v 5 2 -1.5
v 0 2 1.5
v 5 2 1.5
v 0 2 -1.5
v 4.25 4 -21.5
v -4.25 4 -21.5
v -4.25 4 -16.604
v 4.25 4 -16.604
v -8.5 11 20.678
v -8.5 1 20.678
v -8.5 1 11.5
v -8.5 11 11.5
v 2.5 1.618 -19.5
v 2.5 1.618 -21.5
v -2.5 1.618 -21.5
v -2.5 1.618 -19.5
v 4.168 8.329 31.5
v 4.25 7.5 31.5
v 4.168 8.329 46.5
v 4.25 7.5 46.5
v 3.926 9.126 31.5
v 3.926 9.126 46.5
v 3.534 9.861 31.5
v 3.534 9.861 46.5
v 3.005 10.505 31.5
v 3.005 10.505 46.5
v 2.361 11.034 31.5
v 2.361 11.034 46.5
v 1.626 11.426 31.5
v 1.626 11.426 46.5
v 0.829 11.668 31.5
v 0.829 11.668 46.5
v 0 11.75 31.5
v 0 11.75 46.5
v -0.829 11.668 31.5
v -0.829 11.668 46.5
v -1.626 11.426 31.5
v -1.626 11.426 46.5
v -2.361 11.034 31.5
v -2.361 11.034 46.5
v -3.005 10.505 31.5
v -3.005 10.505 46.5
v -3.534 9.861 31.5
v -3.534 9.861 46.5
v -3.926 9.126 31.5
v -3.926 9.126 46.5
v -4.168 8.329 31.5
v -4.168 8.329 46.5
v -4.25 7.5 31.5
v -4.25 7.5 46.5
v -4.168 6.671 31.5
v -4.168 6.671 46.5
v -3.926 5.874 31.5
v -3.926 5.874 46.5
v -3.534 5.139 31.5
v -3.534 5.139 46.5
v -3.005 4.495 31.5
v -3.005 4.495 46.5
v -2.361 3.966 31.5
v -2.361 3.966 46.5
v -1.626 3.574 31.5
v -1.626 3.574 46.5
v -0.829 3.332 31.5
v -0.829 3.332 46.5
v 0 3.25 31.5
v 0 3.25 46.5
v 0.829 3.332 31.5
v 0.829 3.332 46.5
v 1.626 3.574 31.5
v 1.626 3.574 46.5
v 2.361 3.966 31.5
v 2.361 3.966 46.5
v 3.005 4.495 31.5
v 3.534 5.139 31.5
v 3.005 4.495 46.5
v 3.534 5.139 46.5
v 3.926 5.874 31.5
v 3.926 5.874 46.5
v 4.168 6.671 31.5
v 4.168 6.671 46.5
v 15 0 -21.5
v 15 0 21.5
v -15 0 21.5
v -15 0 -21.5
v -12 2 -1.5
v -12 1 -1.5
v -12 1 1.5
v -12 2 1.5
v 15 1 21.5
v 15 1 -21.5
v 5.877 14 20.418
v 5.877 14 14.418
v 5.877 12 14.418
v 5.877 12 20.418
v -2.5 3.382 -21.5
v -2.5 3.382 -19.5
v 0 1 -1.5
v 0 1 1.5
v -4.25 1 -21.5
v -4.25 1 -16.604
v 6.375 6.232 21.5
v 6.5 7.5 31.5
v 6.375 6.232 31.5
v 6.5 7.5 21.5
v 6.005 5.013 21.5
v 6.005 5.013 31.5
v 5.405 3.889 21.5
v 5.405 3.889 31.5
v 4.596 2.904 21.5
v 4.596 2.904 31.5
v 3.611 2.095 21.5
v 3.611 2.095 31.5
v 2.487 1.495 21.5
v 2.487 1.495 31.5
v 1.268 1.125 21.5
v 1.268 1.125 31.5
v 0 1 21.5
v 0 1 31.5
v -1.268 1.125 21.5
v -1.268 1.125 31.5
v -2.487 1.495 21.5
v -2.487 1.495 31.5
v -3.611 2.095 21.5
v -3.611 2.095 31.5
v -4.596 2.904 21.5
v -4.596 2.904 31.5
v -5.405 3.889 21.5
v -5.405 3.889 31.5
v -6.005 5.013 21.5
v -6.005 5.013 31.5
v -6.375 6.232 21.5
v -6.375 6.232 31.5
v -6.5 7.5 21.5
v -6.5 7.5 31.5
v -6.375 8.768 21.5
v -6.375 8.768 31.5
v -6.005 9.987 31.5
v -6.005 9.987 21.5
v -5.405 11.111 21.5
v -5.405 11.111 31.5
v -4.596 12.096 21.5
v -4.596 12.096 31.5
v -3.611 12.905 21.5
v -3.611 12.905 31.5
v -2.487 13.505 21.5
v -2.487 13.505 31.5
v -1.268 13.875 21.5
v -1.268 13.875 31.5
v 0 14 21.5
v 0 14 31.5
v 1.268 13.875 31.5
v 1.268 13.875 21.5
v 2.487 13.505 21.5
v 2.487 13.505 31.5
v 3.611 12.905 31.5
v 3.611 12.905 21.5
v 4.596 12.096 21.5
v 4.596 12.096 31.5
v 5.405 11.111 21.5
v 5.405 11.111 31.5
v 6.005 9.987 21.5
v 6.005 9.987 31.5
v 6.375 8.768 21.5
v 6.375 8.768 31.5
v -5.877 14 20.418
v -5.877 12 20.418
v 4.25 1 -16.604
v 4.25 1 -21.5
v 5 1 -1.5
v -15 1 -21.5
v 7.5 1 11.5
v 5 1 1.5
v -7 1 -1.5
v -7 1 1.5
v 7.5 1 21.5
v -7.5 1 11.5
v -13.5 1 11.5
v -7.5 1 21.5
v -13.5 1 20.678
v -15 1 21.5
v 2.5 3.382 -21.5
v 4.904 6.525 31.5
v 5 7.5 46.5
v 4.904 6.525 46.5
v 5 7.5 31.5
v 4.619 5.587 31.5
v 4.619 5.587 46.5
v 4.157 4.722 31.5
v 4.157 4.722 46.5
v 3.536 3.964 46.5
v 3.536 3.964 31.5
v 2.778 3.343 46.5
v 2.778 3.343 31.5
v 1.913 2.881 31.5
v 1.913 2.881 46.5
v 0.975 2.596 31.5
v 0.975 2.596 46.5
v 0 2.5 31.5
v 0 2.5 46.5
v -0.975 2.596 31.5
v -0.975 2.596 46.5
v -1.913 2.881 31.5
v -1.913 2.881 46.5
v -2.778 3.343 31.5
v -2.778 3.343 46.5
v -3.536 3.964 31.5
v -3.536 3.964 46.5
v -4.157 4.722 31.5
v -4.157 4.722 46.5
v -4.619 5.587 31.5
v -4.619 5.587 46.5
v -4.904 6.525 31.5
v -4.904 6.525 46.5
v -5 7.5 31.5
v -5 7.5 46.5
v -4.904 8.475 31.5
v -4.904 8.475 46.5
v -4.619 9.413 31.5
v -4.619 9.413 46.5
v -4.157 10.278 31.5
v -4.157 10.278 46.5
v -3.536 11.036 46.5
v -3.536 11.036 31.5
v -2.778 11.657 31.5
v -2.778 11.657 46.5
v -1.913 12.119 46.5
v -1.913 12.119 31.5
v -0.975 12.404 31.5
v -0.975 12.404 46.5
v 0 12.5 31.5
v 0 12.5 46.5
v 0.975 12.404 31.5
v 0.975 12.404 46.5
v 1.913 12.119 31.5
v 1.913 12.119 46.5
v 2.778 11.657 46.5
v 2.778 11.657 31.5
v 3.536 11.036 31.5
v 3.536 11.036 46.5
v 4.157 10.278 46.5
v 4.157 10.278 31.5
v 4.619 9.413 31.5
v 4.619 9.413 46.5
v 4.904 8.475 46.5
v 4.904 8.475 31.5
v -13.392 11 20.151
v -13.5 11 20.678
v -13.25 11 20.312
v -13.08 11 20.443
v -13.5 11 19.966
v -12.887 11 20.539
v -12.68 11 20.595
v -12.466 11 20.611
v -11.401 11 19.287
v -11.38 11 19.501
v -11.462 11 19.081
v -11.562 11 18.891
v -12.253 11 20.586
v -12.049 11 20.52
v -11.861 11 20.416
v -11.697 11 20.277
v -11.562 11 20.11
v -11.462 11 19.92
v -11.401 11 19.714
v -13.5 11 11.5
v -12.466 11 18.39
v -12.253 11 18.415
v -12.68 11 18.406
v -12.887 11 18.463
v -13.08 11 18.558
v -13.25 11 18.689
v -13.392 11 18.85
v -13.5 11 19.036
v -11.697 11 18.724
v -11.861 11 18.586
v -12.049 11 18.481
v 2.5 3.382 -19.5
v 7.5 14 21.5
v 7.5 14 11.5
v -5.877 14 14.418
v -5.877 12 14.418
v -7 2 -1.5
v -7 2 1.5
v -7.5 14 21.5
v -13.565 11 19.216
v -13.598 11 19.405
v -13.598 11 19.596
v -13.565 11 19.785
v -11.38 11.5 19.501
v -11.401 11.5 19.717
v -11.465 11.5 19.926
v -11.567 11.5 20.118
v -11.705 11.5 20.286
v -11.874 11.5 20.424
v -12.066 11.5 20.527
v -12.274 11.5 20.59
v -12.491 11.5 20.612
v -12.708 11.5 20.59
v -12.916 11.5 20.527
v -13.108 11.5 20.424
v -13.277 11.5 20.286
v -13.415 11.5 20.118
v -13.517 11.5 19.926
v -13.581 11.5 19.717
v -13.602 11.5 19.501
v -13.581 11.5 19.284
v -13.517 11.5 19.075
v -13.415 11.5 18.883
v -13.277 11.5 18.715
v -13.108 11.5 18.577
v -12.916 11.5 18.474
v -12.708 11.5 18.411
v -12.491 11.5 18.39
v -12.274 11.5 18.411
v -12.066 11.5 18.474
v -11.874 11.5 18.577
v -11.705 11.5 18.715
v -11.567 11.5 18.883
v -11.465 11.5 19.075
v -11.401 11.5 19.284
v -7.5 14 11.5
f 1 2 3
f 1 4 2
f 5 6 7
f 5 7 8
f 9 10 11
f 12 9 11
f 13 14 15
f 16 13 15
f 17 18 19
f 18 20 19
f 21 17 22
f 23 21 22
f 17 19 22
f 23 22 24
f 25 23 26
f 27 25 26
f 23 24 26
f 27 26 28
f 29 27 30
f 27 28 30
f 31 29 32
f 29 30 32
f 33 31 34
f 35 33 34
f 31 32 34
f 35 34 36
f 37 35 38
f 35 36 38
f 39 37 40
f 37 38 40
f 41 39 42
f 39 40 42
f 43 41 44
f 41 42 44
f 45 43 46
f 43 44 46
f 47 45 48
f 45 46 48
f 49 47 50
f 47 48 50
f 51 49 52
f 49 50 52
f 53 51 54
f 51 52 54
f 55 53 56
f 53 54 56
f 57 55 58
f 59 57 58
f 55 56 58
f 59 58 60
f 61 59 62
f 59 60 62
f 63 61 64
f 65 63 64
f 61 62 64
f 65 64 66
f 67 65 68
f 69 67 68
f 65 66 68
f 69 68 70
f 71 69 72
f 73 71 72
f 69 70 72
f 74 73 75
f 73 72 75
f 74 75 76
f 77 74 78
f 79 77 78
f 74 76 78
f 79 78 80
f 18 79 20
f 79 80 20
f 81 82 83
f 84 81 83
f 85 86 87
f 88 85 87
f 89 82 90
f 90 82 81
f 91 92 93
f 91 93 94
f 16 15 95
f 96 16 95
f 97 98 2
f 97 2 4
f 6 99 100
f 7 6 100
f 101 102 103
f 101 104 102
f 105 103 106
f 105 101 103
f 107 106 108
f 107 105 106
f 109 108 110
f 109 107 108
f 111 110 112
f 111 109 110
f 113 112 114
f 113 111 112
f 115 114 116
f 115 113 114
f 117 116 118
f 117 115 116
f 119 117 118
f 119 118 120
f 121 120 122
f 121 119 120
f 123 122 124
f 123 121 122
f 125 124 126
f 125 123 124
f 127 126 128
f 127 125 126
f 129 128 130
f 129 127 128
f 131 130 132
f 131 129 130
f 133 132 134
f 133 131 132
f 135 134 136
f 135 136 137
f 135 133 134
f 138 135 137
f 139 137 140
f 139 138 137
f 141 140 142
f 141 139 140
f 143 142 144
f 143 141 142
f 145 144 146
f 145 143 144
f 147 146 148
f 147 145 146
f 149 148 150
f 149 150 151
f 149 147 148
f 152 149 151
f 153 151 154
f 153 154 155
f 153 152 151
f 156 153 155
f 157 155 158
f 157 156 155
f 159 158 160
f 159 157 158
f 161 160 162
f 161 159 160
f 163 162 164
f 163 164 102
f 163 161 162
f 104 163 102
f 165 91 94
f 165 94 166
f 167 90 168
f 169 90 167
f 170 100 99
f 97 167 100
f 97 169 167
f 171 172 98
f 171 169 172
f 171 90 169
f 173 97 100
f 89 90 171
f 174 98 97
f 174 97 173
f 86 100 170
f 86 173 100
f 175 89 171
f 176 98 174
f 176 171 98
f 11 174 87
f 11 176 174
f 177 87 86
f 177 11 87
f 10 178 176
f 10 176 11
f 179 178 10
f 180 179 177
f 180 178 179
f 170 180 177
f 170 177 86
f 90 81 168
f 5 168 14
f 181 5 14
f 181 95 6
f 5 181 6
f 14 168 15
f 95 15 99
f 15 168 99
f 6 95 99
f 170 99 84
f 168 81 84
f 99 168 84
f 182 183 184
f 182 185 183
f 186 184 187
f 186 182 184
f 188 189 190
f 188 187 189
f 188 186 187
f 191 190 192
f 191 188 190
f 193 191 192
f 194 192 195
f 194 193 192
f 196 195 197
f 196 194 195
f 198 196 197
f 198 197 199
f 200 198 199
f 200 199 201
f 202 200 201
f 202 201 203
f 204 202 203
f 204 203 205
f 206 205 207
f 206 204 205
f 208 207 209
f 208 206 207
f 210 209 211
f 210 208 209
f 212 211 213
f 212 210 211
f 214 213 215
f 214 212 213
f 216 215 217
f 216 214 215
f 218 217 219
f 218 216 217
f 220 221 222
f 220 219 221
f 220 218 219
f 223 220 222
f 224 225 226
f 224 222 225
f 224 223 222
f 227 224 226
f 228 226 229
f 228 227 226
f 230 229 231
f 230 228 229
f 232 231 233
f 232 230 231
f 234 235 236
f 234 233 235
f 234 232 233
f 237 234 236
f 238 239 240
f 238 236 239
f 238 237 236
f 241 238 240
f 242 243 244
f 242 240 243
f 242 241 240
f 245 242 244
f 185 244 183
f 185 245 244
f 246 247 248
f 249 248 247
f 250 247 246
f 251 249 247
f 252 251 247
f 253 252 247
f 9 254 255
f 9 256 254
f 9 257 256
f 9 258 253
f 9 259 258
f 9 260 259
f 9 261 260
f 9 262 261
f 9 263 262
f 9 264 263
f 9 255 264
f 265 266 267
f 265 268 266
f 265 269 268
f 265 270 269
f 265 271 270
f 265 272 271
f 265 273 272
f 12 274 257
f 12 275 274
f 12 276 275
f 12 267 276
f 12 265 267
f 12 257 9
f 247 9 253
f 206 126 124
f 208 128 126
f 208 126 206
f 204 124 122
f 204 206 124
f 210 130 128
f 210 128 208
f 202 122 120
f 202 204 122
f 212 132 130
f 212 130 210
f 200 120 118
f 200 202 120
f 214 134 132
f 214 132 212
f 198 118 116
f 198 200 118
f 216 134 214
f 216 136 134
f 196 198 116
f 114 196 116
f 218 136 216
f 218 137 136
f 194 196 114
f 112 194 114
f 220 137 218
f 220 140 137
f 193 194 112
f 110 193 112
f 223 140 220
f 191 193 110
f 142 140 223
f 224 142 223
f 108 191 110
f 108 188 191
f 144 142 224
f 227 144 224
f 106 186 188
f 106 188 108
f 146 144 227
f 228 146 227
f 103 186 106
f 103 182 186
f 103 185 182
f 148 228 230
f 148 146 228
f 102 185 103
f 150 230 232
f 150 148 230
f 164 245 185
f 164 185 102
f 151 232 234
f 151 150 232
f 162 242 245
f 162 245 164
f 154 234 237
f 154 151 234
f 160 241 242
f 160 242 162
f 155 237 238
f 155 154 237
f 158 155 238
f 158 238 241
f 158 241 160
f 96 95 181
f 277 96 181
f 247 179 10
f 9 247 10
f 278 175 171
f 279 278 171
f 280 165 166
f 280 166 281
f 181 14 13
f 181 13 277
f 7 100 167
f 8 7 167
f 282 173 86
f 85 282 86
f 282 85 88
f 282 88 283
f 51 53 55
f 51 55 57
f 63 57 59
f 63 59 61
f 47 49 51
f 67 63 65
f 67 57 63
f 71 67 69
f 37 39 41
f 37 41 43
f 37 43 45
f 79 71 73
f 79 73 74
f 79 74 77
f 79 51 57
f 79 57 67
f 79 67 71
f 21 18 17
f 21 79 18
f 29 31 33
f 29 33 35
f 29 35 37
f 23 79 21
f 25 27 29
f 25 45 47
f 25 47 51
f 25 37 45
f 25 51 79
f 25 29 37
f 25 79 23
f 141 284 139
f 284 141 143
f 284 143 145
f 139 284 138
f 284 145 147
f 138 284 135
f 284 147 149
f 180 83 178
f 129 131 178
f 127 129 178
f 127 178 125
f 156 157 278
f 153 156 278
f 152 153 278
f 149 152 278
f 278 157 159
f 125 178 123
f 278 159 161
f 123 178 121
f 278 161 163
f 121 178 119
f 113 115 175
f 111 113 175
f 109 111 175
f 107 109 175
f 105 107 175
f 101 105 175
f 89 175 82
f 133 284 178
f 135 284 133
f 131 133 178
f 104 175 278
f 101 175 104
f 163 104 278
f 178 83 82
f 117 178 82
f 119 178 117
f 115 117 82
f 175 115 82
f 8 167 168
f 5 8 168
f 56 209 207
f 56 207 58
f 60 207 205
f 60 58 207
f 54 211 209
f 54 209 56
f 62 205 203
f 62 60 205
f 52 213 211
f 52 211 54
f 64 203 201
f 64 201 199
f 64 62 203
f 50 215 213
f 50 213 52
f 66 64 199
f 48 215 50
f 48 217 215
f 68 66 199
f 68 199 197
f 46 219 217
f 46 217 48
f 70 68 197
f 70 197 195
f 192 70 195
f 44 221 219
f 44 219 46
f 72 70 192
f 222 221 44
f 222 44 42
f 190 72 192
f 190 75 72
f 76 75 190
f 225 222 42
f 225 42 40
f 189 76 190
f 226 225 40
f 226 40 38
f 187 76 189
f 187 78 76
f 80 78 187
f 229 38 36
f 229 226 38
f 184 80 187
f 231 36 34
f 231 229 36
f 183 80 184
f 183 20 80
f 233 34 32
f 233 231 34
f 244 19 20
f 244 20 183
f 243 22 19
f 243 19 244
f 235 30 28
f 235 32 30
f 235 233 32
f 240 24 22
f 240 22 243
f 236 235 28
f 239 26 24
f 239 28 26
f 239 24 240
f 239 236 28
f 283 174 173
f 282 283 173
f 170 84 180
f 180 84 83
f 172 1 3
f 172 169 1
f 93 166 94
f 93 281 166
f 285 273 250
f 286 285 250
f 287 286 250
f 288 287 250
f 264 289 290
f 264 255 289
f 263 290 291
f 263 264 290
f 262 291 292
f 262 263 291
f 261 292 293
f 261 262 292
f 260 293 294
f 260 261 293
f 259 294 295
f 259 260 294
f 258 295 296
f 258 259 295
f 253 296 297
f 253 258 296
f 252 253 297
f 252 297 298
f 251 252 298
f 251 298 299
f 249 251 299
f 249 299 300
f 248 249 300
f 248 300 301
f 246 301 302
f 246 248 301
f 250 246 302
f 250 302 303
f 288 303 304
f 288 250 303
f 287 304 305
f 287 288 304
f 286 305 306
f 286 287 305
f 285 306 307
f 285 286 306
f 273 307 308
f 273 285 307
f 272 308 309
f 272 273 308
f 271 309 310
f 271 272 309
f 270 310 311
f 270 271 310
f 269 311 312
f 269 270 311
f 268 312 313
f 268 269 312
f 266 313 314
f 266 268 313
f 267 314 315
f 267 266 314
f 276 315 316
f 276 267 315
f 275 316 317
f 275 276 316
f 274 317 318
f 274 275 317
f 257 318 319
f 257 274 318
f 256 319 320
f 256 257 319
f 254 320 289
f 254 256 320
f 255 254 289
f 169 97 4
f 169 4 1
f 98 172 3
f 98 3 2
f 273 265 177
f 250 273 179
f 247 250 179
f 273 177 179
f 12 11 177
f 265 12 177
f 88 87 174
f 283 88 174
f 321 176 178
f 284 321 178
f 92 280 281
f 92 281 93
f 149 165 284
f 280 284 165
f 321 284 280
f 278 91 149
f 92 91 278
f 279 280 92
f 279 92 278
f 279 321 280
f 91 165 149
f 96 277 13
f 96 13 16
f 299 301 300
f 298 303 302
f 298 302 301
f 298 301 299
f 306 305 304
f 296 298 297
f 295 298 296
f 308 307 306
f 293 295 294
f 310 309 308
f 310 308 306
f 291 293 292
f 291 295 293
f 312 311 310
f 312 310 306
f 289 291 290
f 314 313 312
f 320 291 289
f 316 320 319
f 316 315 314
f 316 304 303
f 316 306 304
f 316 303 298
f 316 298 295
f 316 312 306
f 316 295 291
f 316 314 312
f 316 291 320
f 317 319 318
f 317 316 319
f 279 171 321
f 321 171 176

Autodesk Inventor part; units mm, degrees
ref_plane "YZ Plane" through (0, 0, 0) normal (1, 0, 0) x (0, 1, 0)
ref_plane "XZ Plane" through (0, 0, 0) normal (0, 1, 0) x (-1, 0, 0)
ref_plane "XY Plane" through (0, 0, 0) normal (0, 0, 1) x (1, 0, 0)
sketch "Sketch1" plane through (0, 0, 0) normal (0, 1, 0) x (-1, 0, 0)
  line L0 (-15, 21.5) -> (-15, -21.5)
  line L1 (-15, -21.5) -> (15, -21.5)
  line L2 (15, -21.5) -> (15, 21.5)
  line L3 (15, 21.5) -> (-15, 21.5)
  line L4 (-15, 21.5) -> (15, -21.5) construction
  line L5 (-15, -21.5) -> (15, 21.5) construction
  point P0 (0, 0)
  dimension "d0" = 43
  dimension "d1" = 30
extrude "Extrusion1" add sketch "Sketch1" along normal blind 1
sketch "Sketch2" plane through (0, 1, 0) normal (0, 1, 0) x (1, 0, 0)
  line L0 (4.25, 16.6043) -> (4.25, 21.5)
  line L1 (4.25, 21.5) -> (-4.25, 21.5)
  line L2 (-4.25, 21.5) -> (-4.25, 16.6043)
  line L3 (-4.25, 16.6043) -> (4.25, 16.6043)
  line L4 (4.25, 16.6043) -> (-4.25, 21.5) construction
  line L5 (4.25, 21.5) -> (-4.25, 16.6043) construction
  line L6 (-15, 21.5) -> (-15, -21.5) construction
  line L7 (-15, 0) -> (-12, 0) construction
  line L8 (-12, 0) -> (-12, -1.5) construction
  line L9 (-12, -1.5) -> (-7, -1.5) construction
  line L10 (-7, -1.5) -> (-7, 1.5) construction
  line L11 (-12, -1.5) -> (-7, -1.5)
  line L12 (-7, -1.5) -> (-7, 1.5)
  line L13 (-7, 1.5) -> (-12, 1.5)
  line L14 (-12, 1.5) -> (-12, -1.5)
  line L15 (15, -21.5) -> (15, 21.5) projected
  line L16 (15, 0) -> (5, 0) construction
  line L17 (5, 0) -> (5, -1.5)
  line L18 (5, -1.5) -> (0, -1.5)
  line L19 (0, -1.5) -> (0, 1.5)
  line L20 (0, 1.5) -> (5, 1.5)
  line L21 (5, 1.5) -> (5, 0)
  line L22 (0, -21.5) -> (7.5, -21.5)
  line L23 (-15, -21.5) -> (15, -21.5) projected
  line L24 (7.5, -21.5) -> (7.5, -11.5)
  line L25 (7.5, -11.5) -> (-7.5, -11.5)
  line L26 (-7.5, -11.5) -> (-7.5, -21.5)
  line L27 (-7.5, -21.5) -> (7.5, -21.5)
  line L28 (-7.5, -11.5) -> (-8.5, -11.5) construction
  line L29 (-8.5, -11.5) -> (-13.5, -11.5)
  line L30 (-13.5, -11.5) -> (-13.5, -20.6777)
  line L31 (-13.5, -20.6777) -> (-8.5, -20.6777)
  line L32 (-8.5, -20.6777) -> (-8.5, -11.5)
  point P0 (0, 0)
  point P1 (0, 19.0521)
  dimension "d4" = 8.5
  dimension "d5" = 3
  dimension "d6" = 1.5
  dimension "d7" = 5
  dimension "d8" = 3
  dimension "d9" = 10
  dimension "d10" = 1.5
  dimension "d11" = 5
  dimension "d12" = 3
  dimension "d13" = 5
  dimension "d14" = 7.5
  dimension "d15" = 10
  dimension "d16" = 15
  dimension "d17" = 1
extrude "Extrusion2" add sketch "Sketch2" along normal blind 1 contours L14 L13 L12 L11 | L17 L18 L19 L20 L21
extrude "Extrusion3" add sketch "Sketch2" along normal blind 3 contours L3 L2 L1 L0
extrude "Extrusion4" add sketch "Sketch2" along normal blind 13 contours L23 L26 L25 L24 L22
extrude "Extrusion5" add sketch "Sketch2" along normal blind 10 contours L32 L31 L30 L29
sketch "Sketch3" plane through (0, 11, 0) normal (0, 1, 0) x (1, 0, 0)
  circle A0 centre (-12.491, -19.5006) radius 1.111
  point P0 (0, 0)
extrude "Extrusion6" add sketch "Sketch3" along normal blind 0.5
sketch "Sketch4" plane through (0, 14, 0) normal (0, 1, 0) x (1, 0, 0)
  line L0 (7.5, -11.5) -> (7.5, -21.5) construction
  line L1 (7.5, -11.5) -> (-7.5, -11.5) construction
  line L2 (7.5, -21.5) -> (-7.5, -11.5) construction
  line L3 (-7.5, -11.5) -> (-7.5, -21.5) construction
  line L4 (-15, -21.5) -> (15, -21.5) construction
  line L5 (-7.5, -21.5) -> (7.5, -11.5) construction
  line L6 (5.8773, -20.4182) -> (-5.8773, -20.4182) construction
  line L7 (-5.8773, -20.4182) -> (-5.8773, -14.4182) construction
  line L8 (-5.8773, -14.4182) -> (5.8773, -14.4182) construction
  line L9 (5.8773, -14.4182) -> (5.8773, -20.4182) construction
  line L10 (5.8773, -20.4182) -> (-5.8773, -20.4182)
  line L11 (-5.8773, -20.4182) -> (-5.8773, -14.4182)
  line L12 (-5.8773, -14.4182) -> (5.8773, -14.4182)
  line L13 (5.8773, -14.4182) -> (5.8773, -20.4182)
  point P0 (0, 0)
  dimension "d28" = 6
extrude "Extrusion7" cut sketch "Sketch4" against normal blind 2
sketch "Sketch5" plane through (15, 0, -21.5) normal (0, 0, -1) x (-1, 0, 0)
  line L0 (10.75, 1) -> (10.75, 4) projected
  line L1 (19.25, 1) -> (19.25, 4) projected
  line L2 (10.75, 1) -> (19.25, 1)
  line L3 (10.75, 1) -> (19.25, 4) construction
  line L4 (19.25, 1) -> (10.75, 4) construction
  line L5 (12.5, 1.6176) -> (12.5, 3.3824)
  line L6 (12.5, 1.6176) -> (17.5, 1.6176)
  line L7 (17.5, 1.6176) -> (17.5, 3.3824)
  line L8 (17.5, 3.3824) -> (12.5, 3.3824)
  point P0 (15, 0)
extrude "Extrusion8" cut sketch "Sketch5" against normal blind 2
sketch "Sketch6" plane through (-15, 0, 21.5) normal (0, 0, 1) x (1, 0, 0)
  line L0 (0, 0) -> (30, 0) projected
  line L1 (30, 0) -> (30, 1) projected
  line L2 (22.5, 1) -> (30, 1) projected
  line L3 (22.5, 1) -> (22.5, 14) projected
  line L4 (7.5, 14) -> (22.5, 14) projected
  line L5 (7.5, 1) -> (7.5, 14) projected
  line L6 (0, 1) -> (7.5, 1) projected
  line L7 (0, 0) -> (0, 1) projected
  circle A0 centre (15, 7.5) radius 6.5
  point P0 (15, 0)
extrude "Extrusion9" add sketch "Sketch6" along normal blind 10 contours A0
sketch "Sketch7" plane through (0, 7.5, 31.5) normal (0, 0, 1) x (1, 0, 0)
  circle A0 centre (0, 0) radius 5
  point P0 (0, -7.5)
  dimension "d35" = 10
extrude "Extrusion10" add sketch "Sketch7" along normal blind 15
thread "Thread1" size "M14x2" class "6g" standard "ANSI Metric M Profile" full length
sketch "Sketch8" plane through (0, 7.5, 46.5) normal (0, 0, 1) x (1, 0, 0)
  circle A0 centre (0, 0) radius 5 projected
  circle A1 centre (0, 0) radius 4.25
  point P0 (0, -7.5)
  dimension "d40" = 0.75
extrude "Extrusion11" cut sketch "Sketch8" against normal blind 15 contours A1
properties part number "Ph Reader"
